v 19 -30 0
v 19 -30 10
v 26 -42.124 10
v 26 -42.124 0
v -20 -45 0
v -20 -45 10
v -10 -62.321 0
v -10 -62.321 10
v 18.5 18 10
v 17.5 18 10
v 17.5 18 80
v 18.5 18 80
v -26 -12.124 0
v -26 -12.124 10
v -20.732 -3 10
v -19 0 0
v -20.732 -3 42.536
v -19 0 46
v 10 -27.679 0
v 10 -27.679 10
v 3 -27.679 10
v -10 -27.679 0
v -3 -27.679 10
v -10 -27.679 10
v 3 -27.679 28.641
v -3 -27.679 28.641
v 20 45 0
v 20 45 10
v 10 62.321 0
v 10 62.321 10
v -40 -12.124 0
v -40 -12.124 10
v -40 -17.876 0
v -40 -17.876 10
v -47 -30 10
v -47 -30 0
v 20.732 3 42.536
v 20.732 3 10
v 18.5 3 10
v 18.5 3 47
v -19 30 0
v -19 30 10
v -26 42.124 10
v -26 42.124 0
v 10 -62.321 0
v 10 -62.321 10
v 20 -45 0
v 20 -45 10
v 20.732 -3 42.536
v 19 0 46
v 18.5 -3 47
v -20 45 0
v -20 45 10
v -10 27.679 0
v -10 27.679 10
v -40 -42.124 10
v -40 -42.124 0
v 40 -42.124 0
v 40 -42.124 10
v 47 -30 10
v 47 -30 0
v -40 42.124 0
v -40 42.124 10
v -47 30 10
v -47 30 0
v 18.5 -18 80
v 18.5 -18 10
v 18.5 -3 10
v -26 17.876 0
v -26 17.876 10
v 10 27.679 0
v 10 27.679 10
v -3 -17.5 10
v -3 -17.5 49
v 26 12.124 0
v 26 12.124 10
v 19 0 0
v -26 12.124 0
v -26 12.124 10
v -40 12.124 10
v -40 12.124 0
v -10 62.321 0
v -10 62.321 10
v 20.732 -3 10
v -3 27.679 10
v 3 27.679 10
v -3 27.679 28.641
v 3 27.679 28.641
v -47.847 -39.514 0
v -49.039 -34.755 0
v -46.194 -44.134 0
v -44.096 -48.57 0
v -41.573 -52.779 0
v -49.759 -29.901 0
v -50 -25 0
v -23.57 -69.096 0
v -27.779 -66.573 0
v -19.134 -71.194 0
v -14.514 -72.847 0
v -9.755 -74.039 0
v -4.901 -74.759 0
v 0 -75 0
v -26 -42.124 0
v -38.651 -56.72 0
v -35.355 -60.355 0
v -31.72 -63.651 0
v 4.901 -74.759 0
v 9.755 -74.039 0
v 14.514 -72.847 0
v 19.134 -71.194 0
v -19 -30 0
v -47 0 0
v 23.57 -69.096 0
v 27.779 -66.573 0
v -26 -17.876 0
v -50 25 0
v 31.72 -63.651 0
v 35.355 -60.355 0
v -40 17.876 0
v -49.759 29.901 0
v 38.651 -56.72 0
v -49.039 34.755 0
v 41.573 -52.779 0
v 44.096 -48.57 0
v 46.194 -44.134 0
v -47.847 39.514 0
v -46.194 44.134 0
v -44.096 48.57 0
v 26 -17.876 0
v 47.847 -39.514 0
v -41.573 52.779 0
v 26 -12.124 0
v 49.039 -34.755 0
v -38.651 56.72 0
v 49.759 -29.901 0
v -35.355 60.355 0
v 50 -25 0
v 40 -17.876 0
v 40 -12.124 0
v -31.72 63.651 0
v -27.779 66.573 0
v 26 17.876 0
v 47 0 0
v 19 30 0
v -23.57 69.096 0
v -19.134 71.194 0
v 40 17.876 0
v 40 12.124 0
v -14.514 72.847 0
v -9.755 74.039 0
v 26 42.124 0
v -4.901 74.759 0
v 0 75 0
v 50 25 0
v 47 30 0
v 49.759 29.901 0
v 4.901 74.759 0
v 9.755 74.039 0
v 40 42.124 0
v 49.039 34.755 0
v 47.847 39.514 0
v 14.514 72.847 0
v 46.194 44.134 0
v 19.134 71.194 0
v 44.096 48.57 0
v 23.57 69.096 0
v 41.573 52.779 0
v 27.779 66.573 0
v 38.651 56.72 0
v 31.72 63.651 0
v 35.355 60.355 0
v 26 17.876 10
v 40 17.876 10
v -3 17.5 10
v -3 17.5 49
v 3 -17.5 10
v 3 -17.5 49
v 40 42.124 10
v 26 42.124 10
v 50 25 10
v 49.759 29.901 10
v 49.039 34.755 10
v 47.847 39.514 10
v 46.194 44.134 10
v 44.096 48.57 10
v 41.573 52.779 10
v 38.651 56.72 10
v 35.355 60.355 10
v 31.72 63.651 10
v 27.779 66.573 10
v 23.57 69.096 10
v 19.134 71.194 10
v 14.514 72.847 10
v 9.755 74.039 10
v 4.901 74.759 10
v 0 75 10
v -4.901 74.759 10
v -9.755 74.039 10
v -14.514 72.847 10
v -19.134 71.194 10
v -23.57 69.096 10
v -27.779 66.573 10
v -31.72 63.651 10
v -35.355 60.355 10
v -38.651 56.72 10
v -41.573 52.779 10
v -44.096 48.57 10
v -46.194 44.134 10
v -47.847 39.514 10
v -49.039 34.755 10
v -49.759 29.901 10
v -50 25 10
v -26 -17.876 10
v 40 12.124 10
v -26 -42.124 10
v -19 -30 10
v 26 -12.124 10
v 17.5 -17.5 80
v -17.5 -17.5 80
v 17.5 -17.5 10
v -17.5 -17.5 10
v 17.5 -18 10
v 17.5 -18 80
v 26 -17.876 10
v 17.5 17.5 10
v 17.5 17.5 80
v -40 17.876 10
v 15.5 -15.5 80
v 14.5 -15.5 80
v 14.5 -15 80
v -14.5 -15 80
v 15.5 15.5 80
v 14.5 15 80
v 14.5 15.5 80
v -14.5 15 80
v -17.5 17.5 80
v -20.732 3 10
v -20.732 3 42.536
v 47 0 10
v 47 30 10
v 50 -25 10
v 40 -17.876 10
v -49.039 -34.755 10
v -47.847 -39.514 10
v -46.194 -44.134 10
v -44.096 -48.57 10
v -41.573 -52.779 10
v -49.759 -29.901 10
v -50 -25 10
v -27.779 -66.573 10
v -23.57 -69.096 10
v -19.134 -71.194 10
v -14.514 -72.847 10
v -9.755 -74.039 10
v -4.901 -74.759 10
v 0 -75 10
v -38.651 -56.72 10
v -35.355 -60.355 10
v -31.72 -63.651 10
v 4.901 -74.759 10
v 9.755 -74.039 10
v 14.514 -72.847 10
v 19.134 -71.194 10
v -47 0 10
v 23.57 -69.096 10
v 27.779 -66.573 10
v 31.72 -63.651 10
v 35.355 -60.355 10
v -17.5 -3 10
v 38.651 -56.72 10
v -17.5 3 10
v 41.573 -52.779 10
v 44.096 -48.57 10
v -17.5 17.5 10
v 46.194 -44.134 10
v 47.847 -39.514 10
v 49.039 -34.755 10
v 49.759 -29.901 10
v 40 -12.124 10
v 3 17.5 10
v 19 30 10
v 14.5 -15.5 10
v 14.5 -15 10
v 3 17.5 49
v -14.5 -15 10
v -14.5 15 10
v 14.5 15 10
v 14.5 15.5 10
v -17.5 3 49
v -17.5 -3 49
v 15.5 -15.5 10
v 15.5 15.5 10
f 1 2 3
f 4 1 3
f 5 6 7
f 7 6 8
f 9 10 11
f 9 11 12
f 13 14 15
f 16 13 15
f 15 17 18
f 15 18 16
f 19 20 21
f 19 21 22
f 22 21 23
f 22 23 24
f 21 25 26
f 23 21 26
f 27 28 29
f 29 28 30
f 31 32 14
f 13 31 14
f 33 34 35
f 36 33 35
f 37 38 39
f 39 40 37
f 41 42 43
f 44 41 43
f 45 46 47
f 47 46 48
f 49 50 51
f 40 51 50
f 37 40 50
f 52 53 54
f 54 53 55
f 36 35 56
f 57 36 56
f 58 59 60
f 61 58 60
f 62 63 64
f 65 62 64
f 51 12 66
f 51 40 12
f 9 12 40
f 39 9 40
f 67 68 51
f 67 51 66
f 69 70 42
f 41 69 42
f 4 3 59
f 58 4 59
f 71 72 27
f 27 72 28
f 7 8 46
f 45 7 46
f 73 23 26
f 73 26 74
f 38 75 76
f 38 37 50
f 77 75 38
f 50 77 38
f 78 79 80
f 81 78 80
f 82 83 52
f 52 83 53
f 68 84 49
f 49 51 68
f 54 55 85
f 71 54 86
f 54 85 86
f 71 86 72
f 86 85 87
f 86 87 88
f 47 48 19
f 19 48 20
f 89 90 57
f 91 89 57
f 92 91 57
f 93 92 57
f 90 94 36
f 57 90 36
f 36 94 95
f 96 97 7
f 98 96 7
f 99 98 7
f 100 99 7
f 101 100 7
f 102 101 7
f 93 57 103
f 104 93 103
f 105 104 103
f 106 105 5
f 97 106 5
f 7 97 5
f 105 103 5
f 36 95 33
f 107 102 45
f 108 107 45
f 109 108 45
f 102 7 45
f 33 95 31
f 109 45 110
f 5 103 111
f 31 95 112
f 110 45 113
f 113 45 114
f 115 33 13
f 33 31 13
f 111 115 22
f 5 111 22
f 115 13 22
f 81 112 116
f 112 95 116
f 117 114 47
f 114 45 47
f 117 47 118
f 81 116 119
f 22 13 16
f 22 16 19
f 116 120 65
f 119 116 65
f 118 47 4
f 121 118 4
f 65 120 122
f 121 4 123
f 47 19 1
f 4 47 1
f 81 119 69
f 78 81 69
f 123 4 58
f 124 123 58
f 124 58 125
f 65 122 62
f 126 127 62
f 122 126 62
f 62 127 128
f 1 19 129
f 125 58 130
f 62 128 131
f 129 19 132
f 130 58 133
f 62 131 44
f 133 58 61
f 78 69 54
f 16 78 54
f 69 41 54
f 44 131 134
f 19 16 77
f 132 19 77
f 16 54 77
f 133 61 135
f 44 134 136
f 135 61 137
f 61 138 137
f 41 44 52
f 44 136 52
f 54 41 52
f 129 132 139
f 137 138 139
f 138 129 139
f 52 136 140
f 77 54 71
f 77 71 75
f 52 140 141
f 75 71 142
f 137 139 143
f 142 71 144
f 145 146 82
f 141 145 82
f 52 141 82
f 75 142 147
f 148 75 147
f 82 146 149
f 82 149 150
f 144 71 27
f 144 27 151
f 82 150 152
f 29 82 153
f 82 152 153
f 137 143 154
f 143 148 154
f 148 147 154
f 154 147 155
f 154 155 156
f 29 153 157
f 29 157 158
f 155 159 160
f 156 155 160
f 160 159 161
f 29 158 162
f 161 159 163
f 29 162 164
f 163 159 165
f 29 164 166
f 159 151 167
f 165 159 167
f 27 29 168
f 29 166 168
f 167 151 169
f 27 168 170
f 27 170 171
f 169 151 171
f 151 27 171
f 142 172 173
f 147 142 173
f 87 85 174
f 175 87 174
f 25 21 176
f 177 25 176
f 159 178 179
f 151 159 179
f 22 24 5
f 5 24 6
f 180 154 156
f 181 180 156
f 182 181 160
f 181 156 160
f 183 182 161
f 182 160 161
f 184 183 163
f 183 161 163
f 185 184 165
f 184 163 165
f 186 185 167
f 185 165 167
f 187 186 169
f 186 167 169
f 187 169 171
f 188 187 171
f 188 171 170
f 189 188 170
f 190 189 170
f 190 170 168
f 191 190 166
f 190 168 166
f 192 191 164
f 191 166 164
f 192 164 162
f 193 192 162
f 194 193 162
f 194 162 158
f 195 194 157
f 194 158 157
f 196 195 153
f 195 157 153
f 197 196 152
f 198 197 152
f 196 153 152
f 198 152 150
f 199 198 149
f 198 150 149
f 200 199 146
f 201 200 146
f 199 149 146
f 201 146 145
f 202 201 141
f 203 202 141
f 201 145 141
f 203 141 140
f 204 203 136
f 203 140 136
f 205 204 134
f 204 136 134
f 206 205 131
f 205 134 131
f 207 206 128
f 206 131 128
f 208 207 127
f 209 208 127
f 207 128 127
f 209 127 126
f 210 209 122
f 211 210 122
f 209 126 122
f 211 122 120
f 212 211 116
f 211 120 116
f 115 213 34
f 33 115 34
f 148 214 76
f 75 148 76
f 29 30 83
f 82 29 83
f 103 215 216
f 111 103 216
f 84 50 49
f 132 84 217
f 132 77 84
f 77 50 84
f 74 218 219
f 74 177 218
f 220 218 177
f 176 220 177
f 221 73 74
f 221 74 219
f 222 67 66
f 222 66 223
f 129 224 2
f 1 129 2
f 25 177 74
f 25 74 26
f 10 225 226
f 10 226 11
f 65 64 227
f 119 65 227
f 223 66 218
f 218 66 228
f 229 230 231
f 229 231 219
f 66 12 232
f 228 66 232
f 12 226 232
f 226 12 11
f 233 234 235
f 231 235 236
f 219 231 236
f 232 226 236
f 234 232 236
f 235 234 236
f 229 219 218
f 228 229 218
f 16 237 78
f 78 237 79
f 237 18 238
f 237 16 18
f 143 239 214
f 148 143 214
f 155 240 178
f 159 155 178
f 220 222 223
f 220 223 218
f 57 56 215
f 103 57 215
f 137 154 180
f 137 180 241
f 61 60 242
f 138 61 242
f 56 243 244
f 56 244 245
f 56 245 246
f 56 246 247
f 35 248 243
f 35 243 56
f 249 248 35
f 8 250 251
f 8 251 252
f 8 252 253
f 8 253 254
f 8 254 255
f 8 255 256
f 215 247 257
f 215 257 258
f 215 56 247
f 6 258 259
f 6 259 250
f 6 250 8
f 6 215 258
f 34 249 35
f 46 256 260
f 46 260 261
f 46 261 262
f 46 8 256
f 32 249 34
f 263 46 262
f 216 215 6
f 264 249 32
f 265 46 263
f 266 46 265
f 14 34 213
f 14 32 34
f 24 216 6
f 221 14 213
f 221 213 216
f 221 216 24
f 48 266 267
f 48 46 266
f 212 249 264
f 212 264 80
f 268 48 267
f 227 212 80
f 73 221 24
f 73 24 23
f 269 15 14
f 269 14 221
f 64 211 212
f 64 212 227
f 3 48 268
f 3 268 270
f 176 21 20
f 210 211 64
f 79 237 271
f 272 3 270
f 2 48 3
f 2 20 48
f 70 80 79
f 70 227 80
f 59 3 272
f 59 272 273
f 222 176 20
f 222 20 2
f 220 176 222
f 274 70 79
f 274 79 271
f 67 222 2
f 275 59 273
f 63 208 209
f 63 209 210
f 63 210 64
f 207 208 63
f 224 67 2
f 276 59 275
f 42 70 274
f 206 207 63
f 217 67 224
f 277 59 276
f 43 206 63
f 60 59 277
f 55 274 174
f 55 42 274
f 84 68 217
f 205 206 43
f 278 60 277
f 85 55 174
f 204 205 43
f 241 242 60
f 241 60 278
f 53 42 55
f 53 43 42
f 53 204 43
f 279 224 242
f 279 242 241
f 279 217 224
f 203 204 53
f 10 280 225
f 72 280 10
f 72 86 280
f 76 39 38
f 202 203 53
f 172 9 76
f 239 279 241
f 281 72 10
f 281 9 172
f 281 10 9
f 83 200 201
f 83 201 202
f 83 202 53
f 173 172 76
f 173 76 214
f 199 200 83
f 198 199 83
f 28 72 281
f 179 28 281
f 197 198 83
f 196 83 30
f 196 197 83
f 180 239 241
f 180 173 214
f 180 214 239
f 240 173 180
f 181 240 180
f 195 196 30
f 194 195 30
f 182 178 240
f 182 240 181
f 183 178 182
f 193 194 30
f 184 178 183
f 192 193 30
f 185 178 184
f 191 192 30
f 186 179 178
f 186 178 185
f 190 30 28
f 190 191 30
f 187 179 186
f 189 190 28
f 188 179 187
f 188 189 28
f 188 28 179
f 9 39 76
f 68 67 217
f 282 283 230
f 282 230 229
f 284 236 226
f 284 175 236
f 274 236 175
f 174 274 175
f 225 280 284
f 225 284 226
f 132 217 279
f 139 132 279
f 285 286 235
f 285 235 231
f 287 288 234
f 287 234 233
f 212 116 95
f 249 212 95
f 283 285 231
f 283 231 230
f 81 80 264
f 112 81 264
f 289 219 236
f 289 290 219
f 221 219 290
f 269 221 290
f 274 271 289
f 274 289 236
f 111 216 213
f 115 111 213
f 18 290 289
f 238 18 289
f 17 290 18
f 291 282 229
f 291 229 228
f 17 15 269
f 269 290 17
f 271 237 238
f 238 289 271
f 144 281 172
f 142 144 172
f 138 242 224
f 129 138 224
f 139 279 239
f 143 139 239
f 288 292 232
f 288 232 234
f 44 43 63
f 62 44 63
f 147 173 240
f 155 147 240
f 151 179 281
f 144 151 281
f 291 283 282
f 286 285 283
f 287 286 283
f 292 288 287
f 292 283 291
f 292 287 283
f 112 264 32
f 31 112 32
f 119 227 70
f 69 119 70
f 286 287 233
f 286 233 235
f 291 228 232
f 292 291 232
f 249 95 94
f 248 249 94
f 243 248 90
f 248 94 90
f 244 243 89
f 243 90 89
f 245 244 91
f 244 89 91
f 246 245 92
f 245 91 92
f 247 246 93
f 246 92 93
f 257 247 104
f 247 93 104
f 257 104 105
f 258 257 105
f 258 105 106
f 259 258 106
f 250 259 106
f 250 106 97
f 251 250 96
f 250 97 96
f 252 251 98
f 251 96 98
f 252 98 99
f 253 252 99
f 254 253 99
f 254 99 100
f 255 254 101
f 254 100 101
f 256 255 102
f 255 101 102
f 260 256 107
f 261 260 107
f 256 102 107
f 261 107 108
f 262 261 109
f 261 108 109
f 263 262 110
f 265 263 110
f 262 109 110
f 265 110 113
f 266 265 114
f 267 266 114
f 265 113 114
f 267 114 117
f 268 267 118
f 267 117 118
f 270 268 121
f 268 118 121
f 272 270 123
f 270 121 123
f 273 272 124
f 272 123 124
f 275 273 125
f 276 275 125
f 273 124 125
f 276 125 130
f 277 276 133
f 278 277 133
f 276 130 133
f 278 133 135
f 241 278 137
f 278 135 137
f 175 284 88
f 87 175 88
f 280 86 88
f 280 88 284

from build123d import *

# Parameters (mm, degrees)
PAD_DEPTH          = 10
PAD001_DEPTH       = 70
PAD002_DEPTH       = 3
PAD002_DEPTH_BACK  = 3
POLARPATTERN_COUNT = 4
POCKET_DEPTH       = 70.001
POCKET_DEPTH_BACK  = 10.001


with BuildPart() as part:
    # Sketch → Pad (new body)
    with BuildSketch(Plane.XY):
        with BuildLine():
            ThreePointArc((50, 25), (0, 75), (-50, 25))
            Line((-50, 25), (-50, -25))
            ThreePointArc((-50, -25), (0, -75), (50, -25))
            Line((50, 25), (50, -25))
        make_face()
    extrude(amount=PAD_DEPTH)

    # Sketch001 (on Face6 of Pad) → Pad001 (join)
    with BuildSketch(Plane.XY.offset(10)):
        Polygon((-17.5, 17.5), (17.5, 17.5), (17.5, 18), (18.5, 18), (18.5, -18), (17.5, -18), (17.5, -17.5), (-17.5, -17.5), align=None)
        Polygon((-14.5, 15), (-14.5, -15), (14.5, -15), (14.5, -15.5), (15.5, -15.5), (15.5, 15.5), (14.5, 15.5), (14.5, 15), align=None, mode=Mode.SUBTRACT)
    extrude(amount=PAD001_DEPTH)

    # Sketch002 → Pad002 (join, two sides)
    with BuildSketch(Plane.YZ) as pad002_sk:
        Polygon((17, 50), (37, 10), (17, 10), align=None)
    pad002 = extrude(amount=PAD002_DEPTH) + extrude(pad002_sk.sketch, amount=-PAD002_DEPTH_BACK)

    # PolarPattern: Pad002 ×4 about axis
    polarpattern_axis = Axis((0, 0, 0), (0, 0, 1))
    for i in range(1, POLARPATTERN_COUNT):
        add(pad002.rotate(polarpattern_axis, i * 360 / POLARPATTERN_COUNT))

    # Sketch003 (on Face5 of Pad001) → Pocket (cut, two sides)
    with BuildSketch(Plane.XY.offset(10)) as pocket_sk:
        Polygon((20, 45), (10, 62.320508), (-10, 62.320508), (-20, 45), (-10, 27.679492), (10, 27.679492), align=None)
        Polygon((-26, 17.875644), (-19, 30), (-26, 42.124356), (-40, 42.124356), (-47, 30), (-40, 17.875644), align=None)
        Polygon((40, 17.875644), (47, 30), (40, 42.124356), (26, 42.124356), (19, 30), (26, 17.875644), align=None)
        Polygon((-19, 0), (-26, 12.124356), (-40, 12.124356), (-47, 0), (-40, -12.124356), (-26, -12.124356), align=None)
        Polygon((20, -45), (10, -27.679492), (-10, -27.679492), (-20, -45), (-10, -62.320508), (10, -62.320508), align=None)
        Polygon((40, -12.124356), (47, 0), (40, 12.124356), (26, 12.124356), (19, 0), (26, -12.124356), align=None)
        Polygon((40, -42.124356), (47, -30), (40, -17.875644), (26, -17.875644), (19, -30), (26, -42.124356), align=None)
        Polygon((-19, -30), (-26, -17.875644), (-40, -17.875644), (-47, -30), (-40, -42.124356), (-26, -42.124356), align=None)
    extrude(amount=POCKET_DEPTH, mode=Mode.SUBTRACT)
    extrude(pocket_sk.sketch, amount=-POCKET_DEPTH_BACK, mode=Mode.SUBTRACT)


solid = part.part
